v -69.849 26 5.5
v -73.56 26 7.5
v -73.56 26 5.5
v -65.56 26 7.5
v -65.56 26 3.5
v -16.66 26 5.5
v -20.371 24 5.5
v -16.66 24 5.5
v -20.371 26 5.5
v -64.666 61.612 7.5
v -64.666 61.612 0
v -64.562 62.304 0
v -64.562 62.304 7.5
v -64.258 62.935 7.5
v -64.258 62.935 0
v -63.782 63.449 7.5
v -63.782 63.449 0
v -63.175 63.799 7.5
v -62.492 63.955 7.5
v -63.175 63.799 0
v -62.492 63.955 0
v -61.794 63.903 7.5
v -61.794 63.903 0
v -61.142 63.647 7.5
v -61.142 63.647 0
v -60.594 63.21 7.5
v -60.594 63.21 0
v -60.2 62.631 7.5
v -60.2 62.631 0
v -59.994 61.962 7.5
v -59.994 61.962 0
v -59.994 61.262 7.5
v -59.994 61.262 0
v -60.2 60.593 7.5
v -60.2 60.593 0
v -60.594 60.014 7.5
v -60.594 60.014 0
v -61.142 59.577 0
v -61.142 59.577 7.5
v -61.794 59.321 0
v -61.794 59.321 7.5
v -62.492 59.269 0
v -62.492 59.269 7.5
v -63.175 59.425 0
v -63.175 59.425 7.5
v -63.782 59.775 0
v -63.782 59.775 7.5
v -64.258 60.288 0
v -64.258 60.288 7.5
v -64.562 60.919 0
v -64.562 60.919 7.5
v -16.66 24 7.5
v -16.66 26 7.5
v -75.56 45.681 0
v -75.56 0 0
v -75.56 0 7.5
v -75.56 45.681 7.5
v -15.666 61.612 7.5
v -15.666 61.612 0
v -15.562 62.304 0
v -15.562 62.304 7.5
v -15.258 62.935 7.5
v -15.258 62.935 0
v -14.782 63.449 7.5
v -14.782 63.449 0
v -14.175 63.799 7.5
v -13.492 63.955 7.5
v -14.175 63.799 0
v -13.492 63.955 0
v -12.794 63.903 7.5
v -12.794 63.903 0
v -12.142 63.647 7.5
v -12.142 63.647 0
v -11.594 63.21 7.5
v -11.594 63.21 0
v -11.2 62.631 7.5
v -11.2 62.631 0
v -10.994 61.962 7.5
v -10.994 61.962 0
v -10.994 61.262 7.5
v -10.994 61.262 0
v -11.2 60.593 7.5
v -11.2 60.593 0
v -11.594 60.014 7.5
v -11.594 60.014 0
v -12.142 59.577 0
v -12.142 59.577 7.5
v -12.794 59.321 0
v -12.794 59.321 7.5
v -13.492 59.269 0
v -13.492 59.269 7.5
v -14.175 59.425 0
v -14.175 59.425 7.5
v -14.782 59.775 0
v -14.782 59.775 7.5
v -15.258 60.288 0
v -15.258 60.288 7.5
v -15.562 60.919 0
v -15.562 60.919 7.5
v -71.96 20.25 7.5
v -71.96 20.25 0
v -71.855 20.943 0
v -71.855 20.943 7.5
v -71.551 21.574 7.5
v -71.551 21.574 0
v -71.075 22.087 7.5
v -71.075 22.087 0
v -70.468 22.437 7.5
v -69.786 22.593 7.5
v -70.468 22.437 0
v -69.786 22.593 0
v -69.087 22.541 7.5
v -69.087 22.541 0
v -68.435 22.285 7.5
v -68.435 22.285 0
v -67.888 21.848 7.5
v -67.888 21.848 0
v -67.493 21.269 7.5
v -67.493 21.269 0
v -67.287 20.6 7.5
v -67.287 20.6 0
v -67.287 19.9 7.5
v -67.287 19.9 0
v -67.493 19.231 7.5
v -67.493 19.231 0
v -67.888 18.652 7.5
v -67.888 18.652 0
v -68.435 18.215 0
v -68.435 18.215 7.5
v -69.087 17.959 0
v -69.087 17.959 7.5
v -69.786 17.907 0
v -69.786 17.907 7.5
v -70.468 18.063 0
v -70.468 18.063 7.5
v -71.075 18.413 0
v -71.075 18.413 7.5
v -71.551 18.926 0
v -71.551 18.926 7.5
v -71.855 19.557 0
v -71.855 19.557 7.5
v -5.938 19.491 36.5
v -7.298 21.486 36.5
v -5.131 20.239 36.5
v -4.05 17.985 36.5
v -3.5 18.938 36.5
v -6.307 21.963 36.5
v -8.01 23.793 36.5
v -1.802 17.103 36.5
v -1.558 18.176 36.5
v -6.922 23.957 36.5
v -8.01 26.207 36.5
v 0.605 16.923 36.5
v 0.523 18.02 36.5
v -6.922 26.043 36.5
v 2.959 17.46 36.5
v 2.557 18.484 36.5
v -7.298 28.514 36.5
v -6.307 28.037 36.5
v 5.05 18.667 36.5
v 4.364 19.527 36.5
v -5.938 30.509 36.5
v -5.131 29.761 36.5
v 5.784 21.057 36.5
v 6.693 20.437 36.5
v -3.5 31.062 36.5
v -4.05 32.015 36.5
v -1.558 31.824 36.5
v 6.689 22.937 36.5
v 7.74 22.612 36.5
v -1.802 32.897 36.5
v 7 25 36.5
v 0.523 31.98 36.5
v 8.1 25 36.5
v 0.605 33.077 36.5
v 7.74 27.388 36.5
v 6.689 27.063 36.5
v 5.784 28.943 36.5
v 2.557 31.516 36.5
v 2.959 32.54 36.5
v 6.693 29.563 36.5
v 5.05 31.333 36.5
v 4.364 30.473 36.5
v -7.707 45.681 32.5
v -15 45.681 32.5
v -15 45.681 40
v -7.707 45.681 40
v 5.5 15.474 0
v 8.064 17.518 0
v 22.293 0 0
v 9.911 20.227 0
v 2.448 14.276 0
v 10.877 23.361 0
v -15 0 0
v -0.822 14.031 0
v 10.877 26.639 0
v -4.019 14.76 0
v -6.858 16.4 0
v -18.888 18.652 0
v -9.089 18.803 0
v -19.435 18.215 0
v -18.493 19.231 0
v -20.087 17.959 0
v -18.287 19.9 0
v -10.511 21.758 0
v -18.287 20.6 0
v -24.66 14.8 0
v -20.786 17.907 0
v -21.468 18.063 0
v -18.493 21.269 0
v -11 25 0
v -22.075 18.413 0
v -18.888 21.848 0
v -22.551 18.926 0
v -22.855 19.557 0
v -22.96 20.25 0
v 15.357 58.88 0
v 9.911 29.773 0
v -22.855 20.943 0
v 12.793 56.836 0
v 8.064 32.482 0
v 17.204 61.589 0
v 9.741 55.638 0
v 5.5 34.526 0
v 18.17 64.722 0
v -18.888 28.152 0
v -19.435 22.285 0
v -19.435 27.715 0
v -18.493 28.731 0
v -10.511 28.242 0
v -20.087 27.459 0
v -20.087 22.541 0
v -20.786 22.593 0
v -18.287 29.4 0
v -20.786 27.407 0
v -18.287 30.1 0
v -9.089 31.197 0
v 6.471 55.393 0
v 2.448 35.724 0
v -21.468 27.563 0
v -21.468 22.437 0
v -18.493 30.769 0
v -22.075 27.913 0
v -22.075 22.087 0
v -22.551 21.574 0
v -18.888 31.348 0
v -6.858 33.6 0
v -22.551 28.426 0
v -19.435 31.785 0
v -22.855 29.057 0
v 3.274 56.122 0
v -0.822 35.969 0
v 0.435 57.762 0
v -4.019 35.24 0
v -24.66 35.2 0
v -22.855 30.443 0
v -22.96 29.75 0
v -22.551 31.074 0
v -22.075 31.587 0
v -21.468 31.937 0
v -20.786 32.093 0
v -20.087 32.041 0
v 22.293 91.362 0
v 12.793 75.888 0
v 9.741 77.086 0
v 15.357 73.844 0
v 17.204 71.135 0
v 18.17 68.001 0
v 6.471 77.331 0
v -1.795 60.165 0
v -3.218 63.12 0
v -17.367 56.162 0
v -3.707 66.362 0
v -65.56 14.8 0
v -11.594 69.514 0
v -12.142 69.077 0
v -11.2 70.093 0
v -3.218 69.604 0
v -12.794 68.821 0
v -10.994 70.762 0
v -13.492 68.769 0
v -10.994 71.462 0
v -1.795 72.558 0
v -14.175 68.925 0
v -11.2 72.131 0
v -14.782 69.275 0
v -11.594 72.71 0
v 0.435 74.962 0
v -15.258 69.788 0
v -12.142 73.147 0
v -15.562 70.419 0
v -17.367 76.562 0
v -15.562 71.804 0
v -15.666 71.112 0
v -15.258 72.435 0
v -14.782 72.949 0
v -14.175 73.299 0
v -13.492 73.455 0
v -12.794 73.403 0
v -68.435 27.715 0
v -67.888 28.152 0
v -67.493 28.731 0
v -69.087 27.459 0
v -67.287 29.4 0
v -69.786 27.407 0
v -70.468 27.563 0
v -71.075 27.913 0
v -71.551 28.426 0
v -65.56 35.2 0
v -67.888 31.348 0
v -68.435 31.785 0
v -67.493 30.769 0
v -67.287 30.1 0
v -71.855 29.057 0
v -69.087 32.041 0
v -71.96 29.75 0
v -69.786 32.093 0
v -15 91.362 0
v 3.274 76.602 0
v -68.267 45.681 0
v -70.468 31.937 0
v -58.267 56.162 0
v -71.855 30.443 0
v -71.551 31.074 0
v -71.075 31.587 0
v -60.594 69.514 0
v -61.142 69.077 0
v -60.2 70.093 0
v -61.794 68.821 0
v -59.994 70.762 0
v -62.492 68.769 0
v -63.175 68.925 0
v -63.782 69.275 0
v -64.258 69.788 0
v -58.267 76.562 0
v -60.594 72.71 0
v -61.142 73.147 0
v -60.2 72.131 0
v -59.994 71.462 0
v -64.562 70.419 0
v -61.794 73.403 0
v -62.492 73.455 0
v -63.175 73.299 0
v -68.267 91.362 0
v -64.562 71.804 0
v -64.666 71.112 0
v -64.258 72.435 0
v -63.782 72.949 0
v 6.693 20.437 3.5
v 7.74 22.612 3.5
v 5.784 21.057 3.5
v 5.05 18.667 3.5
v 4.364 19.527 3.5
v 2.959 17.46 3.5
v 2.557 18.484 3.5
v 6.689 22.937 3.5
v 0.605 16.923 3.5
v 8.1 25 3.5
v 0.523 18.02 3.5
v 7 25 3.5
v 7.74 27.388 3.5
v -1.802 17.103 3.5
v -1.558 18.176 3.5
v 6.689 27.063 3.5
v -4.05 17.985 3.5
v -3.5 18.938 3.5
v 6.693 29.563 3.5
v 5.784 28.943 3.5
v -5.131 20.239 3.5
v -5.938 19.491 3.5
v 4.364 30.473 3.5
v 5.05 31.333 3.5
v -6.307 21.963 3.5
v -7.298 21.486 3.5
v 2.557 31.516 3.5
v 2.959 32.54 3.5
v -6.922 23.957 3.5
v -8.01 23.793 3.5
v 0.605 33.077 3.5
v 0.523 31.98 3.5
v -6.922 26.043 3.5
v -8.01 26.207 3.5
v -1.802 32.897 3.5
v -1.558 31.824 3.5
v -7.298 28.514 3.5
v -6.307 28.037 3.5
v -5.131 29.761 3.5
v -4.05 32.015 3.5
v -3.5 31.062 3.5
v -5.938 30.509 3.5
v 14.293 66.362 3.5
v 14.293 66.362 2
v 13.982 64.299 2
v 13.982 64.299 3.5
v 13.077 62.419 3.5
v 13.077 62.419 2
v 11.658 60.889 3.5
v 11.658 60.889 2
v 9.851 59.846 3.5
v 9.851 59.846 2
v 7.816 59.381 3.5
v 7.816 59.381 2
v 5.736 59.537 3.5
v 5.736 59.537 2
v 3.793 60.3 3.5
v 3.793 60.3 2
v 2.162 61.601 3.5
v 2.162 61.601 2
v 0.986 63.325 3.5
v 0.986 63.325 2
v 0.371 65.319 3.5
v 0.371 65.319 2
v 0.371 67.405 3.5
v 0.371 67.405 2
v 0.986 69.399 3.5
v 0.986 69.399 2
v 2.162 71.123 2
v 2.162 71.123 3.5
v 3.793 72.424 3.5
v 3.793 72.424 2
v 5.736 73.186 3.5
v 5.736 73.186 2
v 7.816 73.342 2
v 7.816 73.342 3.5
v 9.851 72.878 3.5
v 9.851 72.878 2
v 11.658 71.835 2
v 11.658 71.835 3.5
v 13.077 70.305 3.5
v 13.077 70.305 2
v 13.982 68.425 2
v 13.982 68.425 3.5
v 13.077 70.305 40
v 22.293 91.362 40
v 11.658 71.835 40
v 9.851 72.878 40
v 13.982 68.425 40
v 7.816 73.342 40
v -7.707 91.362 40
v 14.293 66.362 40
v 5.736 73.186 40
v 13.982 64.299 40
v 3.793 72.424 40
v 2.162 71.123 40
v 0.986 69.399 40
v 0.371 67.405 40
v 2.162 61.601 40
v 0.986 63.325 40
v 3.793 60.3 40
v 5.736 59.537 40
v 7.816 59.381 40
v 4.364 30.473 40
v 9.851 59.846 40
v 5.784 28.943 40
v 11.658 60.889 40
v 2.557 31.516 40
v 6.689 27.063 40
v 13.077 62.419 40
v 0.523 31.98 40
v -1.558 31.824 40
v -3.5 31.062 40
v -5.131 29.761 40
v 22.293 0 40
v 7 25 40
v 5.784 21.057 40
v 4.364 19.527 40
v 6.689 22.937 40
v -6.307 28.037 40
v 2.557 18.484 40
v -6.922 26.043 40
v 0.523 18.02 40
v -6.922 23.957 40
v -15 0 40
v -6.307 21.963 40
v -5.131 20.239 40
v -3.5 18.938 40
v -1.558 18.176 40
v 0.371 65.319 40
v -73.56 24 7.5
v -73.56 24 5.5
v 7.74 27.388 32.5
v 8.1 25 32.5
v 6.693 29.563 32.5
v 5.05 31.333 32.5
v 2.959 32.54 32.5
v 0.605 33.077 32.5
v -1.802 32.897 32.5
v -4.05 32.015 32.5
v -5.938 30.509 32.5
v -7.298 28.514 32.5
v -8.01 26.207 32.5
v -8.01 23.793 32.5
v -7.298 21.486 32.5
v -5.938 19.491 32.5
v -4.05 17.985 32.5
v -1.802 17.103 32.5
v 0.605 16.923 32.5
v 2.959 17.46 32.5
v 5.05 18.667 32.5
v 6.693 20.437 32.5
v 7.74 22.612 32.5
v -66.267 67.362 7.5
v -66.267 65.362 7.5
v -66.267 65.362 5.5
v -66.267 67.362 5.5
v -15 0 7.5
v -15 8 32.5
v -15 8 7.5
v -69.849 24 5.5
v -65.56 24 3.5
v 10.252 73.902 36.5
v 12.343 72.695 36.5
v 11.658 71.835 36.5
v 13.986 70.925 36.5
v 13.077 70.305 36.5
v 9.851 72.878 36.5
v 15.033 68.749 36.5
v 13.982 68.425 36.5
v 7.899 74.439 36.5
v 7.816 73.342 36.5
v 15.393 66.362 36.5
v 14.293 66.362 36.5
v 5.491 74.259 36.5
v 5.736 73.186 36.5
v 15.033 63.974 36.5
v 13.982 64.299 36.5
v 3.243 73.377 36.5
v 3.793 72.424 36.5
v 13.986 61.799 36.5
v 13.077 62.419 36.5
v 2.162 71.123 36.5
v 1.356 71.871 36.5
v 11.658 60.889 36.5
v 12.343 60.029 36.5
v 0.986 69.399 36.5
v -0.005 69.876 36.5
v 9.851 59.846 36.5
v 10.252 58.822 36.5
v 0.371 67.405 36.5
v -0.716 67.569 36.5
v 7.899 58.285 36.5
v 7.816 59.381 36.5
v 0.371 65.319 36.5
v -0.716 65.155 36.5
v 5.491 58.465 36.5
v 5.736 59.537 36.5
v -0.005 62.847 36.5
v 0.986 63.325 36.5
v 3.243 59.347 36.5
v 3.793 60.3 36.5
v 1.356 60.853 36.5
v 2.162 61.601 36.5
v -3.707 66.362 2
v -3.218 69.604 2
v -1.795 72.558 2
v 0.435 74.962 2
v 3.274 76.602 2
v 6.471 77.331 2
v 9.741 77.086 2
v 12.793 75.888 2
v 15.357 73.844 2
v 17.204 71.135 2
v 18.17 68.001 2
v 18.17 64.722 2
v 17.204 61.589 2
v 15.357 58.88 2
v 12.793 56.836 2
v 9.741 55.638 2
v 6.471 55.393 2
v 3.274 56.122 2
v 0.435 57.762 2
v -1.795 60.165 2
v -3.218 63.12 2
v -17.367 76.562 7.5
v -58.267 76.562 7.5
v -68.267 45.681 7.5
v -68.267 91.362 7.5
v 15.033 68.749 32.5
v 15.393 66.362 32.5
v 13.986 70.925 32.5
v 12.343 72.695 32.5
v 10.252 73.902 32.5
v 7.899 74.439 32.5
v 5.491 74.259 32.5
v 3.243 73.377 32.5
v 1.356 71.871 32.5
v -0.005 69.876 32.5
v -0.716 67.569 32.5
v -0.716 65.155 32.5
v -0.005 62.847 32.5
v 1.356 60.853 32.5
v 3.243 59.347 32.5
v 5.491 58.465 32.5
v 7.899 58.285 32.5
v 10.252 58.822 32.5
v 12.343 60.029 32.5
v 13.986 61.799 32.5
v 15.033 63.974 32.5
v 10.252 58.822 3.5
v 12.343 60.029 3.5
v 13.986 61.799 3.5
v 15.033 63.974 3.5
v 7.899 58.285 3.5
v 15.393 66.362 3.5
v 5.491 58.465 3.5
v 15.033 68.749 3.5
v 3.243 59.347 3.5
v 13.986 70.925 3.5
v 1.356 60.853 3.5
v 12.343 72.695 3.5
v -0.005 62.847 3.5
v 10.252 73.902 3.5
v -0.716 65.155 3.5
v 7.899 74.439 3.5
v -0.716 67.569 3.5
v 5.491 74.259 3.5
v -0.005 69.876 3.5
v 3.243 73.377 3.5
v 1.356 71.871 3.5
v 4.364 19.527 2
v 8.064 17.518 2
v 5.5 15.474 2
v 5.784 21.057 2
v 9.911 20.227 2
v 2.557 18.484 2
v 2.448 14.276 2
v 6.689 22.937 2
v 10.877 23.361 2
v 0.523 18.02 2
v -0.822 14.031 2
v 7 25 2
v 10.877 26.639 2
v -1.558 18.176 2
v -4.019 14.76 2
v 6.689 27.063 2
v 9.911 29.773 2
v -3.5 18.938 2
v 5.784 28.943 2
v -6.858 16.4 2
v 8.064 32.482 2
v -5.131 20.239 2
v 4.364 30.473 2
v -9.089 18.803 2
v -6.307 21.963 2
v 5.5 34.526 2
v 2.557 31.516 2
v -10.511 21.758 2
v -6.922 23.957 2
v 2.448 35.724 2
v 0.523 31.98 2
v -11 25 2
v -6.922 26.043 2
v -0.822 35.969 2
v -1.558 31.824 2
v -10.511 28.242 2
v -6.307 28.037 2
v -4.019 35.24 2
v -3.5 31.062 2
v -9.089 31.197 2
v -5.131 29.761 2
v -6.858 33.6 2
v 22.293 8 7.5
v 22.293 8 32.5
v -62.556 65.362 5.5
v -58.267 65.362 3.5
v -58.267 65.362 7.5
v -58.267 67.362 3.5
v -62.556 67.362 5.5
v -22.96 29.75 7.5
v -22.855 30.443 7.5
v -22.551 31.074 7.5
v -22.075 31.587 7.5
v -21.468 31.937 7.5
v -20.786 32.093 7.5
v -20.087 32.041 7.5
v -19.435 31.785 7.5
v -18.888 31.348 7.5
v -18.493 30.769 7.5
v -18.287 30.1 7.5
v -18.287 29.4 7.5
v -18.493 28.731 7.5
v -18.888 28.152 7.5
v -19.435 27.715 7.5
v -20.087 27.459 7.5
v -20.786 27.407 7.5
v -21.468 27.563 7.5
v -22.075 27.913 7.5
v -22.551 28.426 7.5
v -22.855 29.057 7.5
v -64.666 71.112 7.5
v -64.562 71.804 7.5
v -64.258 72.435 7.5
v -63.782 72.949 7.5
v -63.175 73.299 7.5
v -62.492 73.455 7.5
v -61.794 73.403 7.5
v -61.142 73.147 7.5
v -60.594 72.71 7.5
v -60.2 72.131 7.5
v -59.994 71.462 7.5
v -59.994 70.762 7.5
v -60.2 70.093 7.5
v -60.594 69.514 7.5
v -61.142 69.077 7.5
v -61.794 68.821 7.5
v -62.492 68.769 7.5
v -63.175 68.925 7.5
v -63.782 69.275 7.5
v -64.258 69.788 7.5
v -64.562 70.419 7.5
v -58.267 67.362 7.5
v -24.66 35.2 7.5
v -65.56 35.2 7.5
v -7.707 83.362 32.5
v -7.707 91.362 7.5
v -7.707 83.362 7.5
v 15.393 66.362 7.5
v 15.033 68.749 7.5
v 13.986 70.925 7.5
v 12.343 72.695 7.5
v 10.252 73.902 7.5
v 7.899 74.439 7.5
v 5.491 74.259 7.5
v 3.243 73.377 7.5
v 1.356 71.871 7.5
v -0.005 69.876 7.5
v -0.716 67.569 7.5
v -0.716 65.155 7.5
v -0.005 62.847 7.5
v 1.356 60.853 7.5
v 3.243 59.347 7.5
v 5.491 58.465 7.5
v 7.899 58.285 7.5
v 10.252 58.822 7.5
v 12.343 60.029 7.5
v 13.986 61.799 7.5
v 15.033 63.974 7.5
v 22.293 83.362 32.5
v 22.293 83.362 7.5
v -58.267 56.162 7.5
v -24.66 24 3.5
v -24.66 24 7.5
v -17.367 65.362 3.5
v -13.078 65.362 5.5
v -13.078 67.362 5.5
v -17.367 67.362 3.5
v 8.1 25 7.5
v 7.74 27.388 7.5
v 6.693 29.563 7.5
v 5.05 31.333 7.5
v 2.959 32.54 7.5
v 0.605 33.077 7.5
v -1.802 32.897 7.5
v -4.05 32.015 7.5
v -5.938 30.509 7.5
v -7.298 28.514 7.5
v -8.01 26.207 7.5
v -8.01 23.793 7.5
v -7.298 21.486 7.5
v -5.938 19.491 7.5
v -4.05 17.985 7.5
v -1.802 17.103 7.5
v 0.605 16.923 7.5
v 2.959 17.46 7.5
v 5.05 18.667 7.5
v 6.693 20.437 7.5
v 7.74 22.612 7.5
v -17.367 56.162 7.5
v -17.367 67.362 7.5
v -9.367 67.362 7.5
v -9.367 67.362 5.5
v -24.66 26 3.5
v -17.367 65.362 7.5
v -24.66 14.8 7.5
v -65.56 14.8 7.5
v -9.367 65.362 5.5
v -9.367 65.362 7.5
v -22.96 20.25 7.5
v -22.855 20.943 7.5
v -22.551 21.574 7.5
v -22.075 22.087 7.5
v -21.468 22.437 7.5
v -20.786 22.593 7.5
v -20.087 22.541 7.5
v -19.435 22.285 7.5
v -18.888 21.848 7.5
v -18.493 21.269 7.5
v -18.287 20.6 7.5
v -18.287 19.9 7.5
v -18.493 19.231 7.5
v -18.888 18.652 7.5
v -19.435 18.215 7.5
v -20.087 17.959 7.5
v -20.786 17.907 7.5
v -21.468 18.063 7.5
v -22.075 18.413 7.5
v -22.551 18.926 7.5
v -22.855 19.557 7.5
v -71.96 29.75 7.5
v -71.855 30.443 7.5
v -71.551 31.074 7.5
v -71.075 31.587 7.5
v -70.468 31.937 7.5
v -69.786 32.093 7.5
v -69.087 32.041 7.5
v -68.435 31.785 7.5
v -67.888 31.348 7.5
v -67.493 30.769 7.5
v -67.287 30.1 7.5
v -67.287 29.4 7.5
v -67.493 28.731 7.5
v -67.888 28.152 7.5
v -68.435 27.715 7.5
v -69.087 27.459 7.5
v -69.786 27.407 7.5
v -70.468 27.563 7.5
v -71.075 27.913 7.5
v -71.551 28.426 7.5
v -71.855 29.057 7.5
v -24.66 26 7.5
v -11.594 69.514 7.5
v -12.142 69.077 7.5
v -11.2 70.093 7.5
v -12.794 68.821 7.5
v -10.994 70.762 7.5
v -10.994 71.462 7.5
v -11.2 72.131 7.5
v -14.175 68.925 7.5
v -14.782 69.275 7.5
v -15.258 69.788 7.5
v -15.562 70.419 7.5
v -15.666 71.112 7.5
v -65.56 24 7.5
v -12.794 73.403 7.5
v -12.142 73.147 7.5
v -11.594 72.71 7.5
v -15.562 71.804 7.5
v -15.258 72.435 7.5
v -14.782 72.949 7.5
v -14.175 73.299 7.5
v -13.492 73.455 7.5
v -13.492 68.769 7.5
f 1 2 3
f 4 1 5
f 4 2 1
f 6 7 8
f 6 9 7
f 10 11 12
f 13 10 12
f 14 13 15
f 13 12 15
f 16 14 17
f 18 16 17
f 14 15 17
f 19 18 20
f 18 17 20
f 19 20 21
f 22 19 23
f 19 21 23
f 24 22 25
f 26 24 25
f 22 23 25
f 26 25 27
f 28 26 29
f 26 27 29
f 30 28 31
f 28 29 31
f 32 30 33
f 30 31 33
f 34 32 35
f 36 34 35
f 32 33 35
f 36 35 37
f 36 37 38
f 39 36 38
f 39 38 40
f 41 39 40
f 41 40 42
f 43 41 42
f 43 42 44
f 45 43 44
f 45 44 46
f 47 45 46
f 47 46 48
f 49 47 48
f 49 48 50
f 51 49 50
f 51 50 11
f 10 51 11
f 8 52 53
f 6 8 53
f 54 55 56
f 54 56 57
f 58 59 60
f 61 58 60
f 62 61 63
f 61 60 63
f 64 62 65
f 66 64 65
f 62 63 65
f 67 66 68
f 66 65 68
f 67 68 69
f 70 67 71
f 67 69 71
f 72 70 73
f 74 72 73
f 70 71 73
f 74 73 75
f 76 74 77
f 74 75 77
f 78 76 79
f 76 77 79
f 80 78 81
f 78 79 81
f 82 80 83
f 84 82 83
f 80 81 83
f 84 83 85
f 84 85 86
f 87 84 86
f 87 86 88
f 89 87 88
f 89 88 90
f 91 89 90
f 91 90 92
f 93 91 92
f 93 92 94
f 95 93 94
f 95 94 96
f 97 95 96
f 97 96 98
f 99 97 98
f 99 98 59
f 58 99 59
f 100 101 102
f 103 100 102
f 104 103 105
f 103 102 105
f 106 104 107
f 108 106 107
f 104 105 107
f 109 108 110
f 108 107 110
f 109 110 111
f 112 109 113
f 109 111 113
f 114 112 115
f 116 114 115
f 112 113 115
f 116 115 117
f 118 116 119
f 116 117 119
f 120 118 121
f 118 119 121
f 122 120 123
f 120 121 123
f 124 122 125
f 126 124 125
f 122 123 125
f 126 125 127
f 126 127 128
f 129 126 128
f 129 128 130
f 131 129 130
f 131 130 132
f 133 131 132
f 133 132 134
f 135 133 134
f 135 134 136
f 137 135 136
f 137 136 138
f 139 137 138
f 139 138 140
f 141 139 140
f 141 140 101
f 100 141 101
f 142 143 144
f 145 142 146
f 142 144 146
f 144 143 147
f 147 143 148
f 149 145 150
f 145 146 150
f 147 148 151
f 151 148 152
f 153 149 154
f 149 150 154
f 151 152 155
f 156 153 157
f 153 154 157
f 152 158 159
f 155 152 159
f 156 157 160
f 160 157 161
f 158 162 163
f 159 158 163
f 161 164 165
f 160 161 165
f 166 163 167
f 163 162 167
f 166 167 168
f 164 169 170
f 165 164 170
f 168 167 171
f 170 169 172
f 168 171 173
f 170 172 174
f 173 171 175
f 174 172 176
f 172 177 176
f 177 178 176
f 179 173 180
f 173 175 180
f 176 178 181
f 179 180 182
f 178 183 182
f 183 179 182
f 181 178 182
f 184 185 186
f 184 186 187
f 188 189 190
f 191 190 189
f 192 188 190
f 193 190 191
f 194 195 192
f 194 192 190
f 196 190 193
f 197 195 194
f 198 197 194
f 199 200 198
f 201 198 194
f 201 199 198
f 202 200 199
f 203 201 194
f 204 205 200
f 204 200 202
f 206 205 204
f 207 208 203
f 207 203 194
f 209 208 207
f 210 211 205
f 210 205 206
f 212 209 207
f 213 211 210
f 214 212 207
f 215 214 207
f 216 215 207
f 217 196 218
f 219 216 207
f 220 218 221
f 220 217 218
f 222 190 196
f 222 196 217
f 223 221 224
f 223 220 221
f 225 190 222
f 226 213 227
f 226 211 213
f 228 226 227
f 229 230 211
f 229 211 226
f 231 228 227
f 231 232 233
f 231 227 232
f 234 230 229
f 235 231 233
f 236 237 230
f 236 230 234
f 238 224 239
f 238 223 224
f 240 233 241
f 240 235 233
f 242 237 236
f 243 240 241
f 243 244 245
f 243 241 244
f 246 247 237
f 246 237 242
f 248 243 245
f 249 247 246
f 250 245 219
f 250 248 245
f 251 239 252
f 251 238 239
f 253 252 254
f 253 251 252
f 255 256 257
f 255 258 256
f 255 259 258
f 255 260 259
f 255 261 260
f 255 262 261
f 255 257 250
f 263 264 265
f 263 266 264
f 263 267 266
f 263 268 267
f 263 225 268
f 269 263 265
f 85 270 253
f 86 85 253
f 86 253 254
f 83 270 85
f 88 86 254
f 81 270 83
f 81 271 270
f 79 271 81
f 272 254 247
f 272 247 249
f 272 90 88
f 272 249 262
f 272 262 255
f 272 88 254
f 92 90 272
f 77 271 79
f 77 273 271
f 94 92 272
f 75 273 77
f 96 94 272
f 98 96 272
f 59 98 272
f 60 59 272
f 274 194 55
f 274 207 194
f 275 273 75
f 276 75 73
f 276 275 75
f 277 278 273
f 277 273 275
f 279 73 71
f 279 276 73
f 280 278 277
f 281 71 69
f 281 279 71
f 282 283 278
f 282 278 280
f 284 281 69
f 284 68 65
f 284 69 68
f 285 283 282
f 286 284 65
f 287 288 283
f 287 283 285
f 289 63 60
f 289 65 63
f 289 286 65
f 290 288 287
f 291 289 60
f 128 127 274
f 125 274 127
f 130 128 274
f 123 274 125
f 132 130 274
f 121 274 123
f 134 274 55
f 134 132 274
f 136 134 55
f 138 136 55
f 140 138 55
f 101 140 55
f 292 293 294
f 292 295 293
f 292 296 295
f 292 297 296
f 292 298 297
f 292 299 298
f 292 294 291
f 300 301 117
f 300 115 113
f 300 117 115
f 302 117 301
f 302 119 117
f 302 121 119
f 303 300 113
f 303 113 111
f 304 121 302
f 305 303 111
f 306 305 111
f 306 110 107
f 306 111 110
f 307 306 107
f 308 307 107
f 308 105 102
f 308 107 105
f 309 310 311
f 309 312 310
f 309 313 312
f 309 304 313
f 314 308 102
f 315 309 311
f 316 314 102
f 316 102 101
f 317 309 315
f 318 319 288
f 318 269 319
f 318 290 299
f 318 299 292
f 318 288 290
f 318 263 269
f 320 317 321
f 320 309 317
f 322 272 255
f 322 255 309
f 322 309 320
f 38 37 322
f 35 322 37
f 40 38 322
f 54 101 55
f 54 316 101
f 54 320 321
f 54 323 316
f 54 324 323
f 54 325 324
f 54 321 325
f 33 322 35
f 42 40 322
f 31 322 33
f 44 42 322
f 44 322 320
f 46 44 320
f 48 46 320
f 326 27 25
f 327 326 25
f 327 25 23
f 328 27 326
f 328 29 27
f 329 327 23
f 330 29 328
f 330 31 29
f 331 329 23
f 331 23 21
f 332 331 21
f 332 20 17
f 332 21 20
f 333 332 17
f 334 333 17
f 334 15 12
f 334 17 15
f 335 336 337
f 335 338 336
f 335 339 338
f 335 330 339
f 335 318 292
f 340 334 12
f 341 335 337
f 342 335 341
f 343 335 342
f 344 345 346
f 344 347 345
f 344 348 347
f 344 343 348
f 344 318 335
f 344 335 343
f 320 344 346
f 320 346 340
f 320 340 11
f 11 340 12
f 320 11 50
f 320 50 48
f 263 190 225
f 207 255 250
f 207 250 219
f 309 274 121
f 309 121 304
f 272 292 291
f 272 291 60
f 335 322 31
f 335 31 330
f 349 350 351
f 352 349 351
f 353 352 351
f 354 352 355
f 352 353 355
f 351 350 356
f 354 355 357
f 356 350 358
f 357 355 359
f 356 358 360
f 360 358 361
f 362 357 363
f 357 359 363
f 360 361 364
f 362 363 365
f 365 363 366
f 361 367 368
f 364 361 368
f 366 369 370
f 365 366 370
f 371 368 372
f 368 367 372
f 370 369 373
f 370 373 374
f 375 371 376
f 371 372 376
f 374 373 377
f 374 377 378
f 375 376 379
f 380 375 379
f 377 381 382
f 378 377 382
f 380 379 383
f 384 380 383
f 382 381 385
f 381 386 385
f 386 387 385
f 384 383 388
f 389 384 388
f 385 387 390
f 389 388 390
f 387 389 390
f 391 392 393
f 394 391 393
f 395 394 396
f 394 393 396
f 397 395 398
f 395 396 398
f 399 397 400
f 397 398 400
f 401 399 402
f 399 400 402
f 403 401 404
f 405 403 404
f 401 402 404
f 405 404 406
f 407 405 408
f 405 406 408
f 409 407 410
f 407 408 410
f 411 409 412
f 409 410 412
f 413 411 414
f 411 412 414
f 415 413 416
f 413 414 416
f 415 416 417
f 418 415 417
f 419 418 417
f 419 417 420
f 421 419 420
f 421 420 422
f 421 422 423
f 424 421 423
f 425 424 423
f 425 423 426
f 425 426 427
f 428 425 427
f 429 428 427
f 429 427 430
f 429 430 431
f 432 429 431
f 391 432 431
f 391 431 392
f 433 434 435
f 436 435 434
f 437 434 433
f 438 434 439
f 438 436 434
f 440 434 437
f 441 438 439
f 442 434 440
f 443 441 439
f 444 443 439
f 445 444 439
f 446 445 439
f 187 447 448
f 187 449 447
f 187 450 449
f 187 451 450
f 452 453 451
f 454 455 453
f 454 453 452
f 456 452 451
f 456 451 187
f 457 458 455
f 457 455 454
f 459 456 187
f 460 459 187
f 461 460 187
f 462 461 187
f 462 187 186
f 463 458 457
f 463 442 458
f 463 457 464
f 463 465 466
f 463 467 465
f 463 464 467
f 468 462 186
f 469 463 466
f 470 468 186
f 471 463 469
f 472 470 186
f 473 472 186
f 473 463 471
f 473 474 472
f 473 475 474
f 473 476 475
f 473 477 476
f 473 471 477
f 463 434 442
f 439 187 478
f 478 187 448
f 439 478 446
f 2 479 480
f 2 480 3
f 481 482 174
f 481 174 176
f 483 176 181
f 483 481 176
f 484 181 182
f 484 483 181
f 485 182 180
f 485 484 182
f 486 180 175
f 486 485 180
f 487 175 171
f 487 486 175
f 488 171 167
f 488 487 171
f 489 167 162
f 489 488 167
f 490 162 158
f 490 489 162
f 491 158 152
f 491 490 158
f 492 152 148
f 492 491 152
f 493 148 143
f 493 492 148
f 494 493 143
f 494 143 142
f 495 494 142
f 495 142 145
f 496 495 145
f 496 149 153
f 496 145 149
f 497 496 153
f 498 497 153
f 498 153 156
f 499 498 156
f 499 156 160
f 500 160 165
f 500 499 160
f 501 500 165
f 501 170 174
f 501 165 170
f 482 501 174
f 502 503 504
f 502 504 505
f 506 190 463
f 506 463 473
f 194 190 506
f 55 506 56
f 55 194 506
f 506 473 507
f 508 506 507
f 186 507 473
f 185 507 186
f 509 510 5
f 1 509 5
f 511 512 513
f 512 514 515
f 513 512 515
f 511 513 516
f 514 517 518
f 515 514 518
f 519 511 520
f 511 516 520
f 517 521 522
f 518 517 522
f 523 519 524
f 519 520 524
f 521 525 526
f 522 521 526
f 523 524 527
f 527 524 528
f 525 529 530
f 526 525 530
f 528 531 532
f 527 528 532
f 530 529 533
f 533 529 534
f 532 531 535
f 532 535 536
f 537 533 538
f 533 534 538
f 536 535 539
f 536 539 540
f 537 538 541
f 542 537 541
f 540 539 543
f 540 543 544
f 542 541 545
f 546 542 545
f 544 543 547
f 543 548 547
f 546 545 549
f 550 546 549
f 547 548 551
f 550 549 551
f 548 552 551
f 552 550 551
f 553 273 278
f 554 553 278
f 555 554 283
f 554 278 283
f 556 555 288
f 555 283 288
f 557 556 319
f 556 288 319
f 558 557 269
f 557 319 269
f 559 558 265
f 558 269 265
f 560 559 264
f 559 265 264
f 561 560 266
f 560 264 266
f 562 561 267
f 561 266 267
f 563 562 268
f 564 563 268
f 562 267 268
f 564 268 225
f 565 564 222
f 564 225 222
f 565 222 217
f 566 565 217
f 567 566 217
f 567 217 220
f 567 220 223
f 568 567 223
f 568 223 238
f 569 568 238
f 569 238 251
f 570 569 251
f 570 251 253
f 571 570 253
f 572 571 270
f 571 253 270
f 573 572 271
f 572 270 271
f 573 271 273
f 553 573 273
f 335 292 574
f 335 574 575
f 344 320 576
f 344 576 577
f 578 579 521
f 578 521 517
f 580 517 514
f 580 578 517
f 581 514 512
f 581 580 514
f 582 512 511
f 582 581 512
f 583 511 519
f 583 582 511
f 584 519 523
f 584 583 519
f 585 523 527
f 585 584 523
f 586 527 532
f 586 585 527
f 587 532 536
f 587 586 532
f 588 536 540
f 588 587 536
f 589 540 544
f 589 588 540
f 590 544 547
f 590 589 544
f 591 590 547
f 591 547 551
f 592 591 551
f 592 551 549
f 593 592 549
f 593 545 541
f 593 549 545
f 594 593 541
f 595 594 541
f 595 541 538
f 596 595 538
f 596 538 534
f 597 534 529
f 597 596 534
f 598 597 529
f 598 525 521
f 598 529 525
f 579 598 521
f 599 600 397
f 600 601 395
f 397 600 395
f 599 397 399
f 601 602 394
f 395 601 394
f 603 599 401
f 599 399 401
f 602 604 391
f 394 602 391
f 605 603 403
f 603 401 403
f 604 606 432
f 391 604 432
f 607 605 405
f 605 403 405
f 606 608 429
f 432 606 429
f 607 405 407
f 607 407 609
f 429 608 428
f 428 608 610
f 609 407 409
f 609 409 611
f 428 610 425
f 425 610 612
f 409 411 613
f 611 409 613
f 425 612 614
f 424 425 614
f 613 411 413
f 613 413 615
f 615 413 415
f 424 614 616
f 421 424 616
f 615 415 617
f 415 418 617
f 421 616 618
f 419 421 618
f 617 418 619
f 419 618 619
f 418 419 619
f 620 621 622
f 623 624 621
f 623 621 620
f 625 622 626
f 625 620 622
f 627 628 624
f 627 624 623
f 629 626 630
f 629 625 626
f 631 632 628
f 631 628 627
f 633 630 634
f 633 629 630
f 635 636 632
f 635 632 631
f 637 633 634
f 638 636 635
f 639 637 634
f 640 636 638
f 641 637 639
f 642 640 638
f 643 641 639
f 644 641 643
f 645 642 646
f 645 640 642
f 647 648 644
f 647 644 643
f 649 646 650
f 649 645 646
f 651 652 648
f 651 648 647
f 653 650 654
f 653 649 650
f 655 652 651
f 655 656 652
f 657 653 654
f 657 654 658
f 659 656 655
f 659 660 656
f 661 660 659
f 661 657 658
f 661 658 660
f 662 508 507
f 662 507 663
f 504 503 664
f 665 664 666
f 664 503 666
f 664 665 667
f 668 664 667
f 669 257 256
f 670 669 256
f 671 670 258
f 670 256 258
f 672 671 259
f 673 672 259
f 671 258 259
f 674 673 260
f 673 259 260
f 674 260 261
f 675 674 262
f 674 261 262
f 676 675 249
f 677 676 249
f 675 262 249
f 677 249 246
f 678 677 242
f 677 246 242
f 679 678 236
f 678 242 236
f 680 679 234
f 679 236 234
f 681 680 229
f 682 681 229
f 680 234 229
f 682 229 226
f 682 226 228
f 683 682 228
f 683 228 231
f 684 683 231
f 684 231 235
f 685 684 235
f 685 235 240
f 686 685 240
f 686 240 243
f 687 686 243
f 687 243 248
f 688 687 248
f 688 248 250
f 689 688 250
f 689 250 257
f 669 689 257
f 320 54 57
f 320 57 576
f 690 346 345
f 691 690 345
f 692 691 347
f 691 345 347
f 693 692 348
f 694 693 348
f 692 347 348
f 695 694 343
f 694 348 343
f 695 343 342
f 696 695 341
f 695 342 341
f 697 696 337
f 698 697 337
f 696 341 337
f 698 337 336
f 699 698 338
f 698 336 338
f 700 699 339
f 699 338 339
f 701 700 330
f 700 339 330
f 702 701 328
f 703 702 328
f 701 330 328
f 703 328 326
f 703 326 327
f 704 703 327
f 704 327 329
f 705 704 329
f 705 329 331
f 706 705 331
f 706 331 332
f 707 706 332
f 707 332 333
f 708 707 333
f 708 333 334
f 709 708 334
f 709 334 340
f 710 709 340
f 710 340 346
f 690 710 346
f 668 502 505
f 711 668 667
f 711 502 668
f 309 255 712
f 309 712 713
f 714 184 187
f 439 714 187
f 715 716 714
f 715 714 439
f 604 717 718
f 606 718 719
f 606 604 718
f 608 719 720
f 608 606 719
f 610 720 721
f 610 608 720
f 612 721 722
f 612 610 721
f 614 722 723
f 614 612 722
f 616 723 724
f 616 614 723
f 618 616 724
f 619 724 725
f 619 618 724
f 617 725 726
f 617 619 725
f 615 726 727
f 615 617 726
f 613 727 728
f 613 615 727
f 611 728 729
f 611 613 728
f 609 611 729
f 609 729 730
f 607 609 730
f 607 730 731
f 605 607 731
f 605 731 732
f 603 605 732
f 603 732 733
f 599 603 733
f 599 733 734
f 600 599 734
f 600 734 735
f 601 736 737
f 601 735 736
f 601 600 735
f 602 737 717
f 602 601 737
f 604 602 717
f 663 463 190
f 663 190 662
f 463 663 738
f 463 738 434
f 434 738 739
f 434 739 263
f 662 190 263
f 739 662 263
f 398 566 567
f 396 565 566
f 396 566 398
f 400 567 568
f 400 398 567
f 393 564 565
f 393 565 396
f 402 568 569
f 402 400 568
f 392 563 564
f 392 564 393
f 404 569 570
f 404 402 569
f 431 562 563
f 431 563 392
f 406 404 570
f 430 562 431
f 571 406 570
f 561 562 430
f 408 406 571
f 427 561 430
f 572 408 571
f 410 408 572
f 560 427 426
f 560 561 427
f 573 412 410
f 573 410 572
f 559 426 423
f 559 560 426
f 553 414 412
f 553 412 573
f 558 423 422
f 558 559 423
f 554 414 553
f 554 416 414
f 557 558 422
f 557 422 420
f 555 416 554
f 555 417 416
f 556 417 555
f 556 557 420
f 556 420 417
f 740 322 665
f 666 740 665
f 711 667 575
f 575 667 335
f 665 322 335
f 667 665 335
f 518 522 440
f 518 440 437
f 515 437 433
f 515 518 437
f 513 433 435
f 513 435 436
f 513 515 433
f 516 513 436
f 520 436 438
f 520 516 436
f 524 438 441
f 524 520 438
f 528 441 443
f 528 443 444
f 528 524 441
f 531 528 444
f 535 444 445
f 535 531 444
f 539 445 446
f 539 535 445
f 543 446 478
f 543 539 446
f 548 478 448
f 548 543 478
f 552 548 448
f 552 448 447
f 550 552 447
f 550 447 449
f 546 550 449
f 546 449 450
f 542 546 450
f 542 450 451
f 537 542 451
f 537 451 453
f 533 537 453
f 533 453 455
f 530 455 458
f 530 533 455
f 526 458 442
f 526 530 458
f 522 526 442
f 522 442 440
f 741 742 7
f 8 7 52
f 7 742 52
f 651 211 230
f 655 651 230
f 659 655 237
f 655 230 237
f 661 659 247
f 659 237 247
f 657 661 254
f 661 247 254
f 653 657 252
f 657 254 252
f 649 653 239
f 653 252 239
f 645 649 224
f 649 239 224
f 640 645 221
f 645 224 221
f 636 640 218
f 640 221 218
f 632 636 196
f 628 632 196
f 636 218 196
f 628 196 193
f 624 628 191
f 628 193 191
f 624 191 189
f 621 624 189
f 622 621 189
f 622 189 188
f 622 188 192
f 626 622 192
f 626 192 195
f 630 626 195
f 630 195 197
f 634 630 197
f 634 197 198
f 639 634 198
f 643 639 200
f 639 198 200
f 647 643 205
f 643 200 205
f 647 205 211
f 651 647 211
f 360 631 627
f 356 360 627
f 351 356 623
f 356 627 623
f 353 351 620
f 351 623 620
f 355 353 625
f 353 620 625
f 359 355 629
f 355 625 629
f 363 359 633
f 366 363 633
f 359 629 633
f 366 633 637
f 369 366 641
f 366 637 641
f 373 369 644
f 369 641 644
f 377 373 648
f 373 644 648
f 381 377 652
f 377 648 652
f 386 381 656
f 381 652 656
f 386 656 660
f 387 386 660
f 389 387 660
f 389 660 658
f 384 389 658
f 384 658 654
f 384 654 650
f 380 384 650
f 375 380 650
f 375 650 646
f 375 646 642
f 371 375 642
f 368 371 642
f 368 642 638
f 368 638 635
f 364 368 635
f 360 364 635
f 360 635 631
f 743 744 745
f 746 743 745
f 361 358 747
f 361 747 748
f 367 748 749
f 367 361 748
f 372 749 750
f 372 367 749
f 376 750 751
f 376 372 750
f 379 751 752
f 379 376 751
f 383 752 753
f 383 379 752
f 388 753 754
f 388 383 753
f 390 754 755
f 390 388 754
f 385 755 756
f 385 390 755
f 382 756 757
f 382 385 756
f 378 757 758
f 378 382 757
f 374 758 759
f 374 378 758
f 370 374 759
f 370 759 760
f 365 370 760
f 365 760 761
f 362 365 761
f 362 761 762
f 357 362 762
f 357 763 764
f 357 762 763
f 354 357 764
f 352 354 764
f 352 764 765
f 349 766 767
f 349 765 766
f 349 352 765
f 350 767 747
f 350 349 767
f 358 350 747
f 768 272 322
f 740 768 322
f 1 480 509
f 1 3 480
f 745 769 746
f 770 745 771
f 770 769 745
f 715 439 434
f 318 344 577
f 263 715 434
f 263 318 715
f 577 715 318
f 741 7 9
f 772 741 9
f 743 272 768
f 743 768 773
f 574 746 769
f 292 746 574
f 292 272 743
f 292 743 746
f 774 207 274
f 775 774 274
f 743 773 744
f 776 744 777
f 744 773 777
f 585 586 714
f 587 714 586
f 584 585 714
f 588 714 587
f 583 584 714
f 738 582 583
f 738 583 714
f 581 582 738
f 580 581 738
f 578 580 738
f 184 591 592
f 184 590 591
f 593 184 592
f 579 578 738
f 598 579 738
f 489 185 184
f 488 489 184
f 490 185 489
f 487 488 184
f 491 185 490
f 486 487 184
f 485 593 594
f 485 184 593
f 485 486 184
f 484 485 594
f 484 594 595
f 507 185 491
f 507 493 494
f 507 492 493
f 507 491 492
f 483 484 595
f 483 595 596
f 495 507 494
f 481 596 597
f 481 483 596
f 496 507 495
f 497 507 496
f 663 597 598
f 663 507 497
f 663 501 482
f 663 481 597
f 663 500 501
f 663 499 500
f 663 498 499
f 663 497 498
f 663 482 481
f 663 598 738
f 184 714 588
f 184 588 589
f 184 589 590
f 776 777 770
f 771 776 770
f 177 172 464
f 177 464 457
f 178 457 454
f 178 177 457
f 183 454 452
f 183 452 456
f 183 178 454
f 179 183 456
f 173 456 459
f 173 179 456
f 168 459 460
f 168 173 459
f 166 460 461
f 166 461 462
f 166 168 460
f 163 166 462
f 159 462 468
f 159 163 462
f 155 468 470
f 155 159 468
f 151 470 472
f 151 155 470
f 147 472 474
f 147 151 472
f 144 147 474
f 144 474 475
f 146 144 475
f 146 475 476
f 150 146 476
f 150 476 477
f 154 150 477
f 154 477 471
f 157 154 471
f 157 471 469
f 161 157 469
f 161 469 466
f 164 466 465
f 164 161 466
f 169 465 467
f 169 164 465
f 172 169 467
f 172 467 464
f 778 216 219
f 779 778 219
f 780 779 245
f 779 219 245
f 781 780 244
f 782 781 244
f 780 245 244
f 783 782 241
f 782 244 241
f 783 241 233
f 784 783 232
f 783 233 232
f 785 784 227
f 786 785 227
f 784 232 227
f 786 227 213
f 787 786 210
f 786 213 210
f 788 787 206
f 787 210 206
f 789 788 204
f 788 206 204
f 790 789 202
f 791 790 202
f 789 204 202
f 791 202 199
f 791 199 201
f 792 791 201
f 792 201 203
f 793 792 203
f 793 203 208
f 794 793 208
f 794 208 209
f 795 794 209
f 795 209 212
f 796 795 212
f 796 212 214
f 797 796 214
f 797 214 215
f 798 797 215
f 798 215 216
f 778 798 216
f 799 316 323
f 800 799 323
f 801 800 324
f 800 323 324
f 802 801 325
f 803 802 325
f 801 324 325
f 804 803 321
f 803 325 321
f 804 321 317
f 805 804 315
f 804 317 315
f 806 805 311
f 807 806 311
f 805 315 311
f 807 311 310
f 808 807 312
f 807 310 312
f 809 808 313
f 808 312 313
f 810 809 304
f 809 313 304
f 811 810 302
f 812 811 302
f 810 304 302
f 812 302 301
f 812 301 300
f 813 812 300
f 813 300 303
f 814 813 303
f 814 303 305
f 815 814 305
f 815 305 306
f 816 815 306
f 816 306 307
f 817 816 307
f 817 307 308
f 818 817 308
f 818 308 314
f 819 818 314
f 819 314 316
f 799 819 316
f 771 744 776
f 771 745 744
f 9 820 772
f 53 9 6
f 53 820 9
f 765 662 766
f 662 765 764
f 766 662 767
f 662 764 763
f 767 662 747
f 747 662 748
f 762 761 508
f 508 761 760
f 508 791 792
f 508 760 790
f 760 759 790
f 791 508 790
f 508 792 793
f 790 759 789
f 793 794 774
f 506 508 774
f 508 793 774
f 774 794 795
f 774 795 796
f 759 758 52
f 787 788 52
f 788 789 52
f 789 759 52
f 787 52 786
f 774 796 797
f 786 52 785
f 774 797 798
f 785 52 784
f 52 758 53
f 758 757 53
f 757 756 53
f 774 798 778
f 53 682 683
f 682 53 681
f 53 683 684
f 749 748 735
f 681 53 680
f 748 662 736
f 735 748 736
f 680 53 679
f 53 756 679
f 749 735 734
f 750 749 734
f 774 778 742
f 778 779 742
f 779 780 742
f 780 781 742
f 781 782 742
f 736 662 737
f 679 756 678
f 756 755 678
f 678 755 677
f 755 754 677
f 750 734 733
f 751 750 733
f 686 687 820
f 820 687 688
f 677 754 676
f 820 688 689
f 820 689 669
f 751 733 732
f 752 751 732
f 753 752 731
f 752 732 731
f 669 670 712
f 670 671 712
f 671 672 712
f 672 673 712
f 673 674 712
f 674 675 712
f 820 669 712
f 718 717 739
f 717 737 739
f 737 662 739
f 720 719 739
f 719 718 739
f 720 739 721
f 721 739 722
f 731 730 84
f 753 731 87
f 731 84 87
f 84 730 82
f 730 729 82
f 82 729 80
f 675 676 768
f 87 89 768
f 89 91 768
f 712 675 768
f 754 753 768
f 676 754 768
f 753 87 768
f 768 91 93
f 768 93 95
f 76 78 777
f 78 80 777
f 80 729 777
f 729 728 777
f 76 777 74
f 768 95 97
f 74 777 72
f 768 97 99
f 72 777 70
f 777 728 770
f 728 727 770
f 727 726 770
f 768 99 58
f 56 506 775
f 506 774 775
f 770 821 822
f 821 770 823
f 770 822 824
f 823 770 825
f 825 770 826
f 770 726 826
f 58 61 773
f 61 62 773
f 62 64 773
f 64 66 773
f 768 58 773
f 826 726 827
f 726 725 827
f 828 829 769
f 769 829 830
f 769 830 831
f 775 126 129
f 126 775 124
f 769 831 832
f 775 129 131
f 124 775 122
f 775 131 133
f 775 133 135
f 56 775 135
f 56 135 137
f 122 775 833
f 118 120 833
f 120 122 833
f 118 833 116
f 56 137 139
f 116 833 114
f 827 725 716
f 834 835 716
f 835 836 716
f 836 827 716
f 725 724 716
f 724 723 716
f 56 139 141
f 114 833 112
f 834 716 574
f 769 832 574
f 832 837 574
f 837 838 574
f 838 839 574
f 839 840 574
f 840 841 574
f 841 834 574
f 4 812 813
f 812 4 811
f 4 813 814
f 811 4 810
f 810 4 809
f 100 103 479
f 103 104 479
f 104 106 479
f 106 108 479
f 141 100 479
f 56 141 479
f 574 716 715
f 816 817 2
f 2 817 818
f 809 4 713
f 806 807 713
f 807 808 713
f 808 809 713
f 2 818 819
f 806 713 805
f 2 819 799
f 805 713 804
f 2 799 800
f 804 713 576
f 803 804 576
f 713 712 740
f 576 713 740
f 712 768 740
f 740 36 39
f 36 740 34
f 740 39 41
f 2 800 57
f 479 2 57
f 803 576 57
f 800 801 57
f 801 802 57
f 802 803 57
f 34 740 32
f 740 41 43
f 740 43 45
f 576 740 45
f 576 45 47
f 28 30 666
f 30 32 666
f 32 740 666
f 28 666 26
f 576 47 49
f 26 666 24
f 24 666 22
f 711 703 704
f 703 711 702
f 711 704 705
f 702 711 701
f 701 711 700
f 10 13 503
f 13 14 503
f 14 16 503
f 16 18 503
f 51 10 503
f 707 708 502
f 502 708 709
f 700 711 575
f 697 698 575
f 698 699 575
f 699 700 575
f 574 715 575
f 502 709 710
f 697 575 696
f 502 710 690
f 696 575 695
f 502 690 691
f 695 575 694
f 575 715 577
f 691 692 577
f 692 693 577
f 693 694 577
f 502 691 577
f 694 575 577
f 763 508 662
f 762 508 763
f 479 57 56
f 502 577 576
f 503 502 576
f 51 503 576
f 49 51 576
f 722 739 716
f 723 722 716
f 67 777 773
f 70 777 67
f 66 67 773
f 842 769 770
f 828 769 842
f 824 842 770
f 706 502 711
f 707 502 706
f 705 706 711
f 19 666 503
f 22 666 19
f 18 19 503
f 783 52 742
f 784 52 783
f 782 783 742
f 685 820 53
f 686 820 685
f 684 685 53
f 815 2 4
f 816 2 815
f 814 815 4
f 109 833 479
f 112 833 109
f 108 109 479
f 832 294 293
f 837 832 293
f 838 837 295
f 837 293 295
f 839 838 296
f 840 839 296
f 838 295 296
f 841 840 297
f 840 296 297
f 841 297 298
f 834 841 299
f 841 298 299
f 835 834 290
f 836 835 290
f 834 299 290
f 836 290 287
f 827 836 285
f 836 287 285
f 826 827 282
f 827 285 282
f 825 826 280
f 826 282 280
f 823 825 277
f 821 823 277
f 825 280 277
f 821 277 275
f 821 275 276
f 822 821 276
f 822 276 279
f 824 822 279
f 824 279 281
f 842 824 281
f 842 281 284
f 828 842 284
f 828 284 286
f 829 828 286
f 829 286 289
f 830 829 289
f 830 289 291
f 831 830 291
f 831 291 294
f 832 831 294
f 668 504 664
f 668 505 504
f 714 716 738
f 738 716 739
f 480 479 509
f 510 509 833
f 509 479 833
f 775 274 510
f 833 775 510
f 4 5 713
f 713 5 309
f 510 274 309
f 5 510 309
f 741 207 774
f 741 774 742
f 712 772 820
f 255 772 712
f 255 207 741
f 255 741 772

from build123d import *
from OCP.BRepFilletAPI import BRepFilletAPI_MakeChamfer

# Parameters (mm, degrees)
SKETCH1_W           = 37.293223462
SKETCH1_H           = 91.361925627
SKETCH1_R           = 8.1
BOSS_EXTRUDE1_DEPTH = 40
CUT_EXTRUDE1_START  = 8
SKETCH2_W           = 37.293223462
SKETCH2_H           = 25
CUT_EXTRUDE1_DEPTH  = 95.195837814
BOSS_EXTRUDE2_START = -3.5
SKETCH10_R          = 8.1
SKETCH10_R_2        = 7
SKETCH10_R_3        = 10.837031589
BOSS_EXTRUDE2_DEPTH = 3.5
SKETCH11_R          = 8.1
SKETCH11_R_2        = 7
BOSS_EXTRUDE3_DEPTH = 3.5
SKETCH12_W          = 40.9
SKETCH12_H          = 20.4
BOSS_EXTRUDE4_DEPTH = 7.5
CUT_EXTRUDE2_REACH  = 127.125
SKETCH13_R          = 2.3495
SKETCH22_W          = 8
SKETCH22_H          = 2
CUT_EXTRUDE6_DEPTH  = 2
SKETCH14_W          = 37.293223462
SKETCH14_H          = 8
BOSS_EXTRUDE5_DEPTH = 25
CUT_EXTRUDE4_START  = -32.5
SKETCH18_W          = 7.293223462
SKETCH18_H          = 45.680962814
CUT_EXTRUDE4_DEPTH  = 32.5
SKETCH15_R          = 11
CUT_EXTRUDE3_DEPTH  = 2
CHAMFER2_SIZE       = 2
CHAMFER2_SIZE2      = 4.289013841


with BuildPart() as part:
    # Sketch1 → Boss-Extrude1 (new body)
    with BuildSketch(Plane.XY):
        with Locations((3.646611731, 45.680962814)):
            Rectangle(SKETCH1_W, SKETCH1_H)
        with Locations((0, 25)):
            Circle(SKETCH1_R, mode=Mode.SUBTRACT)
        with Locations((7.293223462, 66.361925627)):
            Circle(SKETCH1_R, mode=Mode.SUBTRACT)
    extrude(amount=BOSS_EXTRUDE1_DEPTH)

    # Sketch2 → Cut-Extrude1 (cut, through all)
    with BuildSketch(Plane(origin=(0, 0, 0), x_dir=(1, 0, 0), z_dir=(0, 1, 0)).offset(CUT_EXTRUDE1_START)):
        with Locations((3.646611731, -20)):
            Rectangle(SKETCH2_W, SKETCH2_H)
    extrude(amount=CUT_EXTRUDE1_DEPTH, mode=Mode.SUBTRACT)

    # Sketch10 → Boss-Extrude2 (add)
    # profile 1 of 2: a face of its own
    with BuildSketch(Plane.XY.offset(40).offset(BOSS_EXTRUDE2_START)):
        with Locations(Location((7.293223462, 66.361925627, 0), (0, 0, 180))):
            Circle(SKETCH10_R)
        with Locations((7.293223462, 66.361925627)):
            Circle(SKETCH10_R_2, mode=Mode.SUBTRACT)
    # profile 2 of 2: a face of its own
    with BuildSketch(Plane.XY.offset(40).offset(BOSS_EXTRUDE2_START)):
        with Locations((0, 25)):
            Circle(SKETCH10_R_3)
        with Locations((0, 25)):
            Circle(SKETCH10_R_2, mode=Mode.SUBTRACT)
    extrude(amount=BOSS_EXTRUDE2_DEPTH)

    # Sketch11 → Boss-Extrude3 (add)
    # profile 1 of 2: a face of its own
    with BuildSketch(Plane(origin=(0, 0, 0), x_dir=(-1, 0, 0), z_dir=(0, 0, -1))):
        with Locations((-7.293223462, 66.361925627)):
            Circle(SKETCH11_R)
        with Locations(Location((-7.293223462, 66.361925627, 0), (0, 0, 180))):
            Circle(SKETCH11_R_2, mode=Mode.SUBTRACT)
    # profile 2 of 2: a face of its own
    with BuildSketch(Plane(origin=(0, 0, 0), x_dir=(-1, 0, 0), z_dir=(0, 0, -1))):
        with Locations((0, 25)):
            Circle(SKETCH11_R)
        with Locations(Location((0, 25, 0), (0, 0, 180))):
            Circle(SKETCH11_R_2, mode=Mode.SUBTRACT)
    extrude(amount=-BOSS_EXTRUDE3_DEPTH)

    # Sketch12 → Boss-Extrude4 (add)
    with BuildSketch(Plane(origin=(0, 0, 0), x_dir=(-1, 0, 0), z_dir=(0, 0, -1))):
        Polygon((15, 0), (75.56, 0), (75.56, 45.680962813), (68.266776538, 45.680962813), (68.266776538, 91.361925627), (15, 91.361925627), align=None)
        with Locations((45.11, 25)):
            Rectangle(SKETCH12_W, SKETCH12_H, mode=Mode.SUBTRACT)
        with Locations((37.816776538, 66.361925627)):
            Rectangle(SKETCH12_W, SKETCH12_H, mode=Mode.SUBTRACT)
    extrude(amount=-BOSS_EXTRUDE4_DEPTH)

    # Sketch13 → Cut-Extrude2 (cut, up to next)
    with BuildSketch(Plane(origin=(0, 0, 0), x_dir=(-1, 0, 0), z_dir=(0, 0, -1)), mode=Mode.PRIVATE) as cut_extrude2_sk1:
        with Locations((20.61, 29.75)):
            Circle(SKETCH13_R)
    cut_extrude2_tool1 = extrude(cut_extrude2_sk1.sketch, amount=-CUT_EXTRUDE2_REACH, mode=Mode.PRIVATE) & part.part
    # Sketch13 → Cut-Extrude2 (cut, up to next)
    with BuildSketch(Plane(origin=(0, 0, 0), x_dir=(-1, 0, 0), z_dir=(0, 0, -1)), mode=Mode.PRIVATE) as cut_extrude2_sk2:
        with Locations((20.61, 20.25)):
            Circle(SKETCH13_R)
    cut_extrude2_tool2 = extrude(cut_extrude2_sk2.sketch, amount=-CUT_EXTRUDE2_REACH, mode=Mode.PRIVATE) & part.part
    # Sketch13 → Cut-Extrude2 (cut, up to next)
    with BuildSketch(Plane(origin=(0, 0, 0), x_dir=(-1, 0, 0), z_dir=(0, 0, -1)), mode=Mode.PRIVATE) as cut_extrude2_sk3:
        with Locations((69.61, 29.75)):
            Circle(SKETCH13_R)
    cut_extrude2_tool3 = extrude(cut_extrude2_sk3.sketch, amount=-CUT_EXTRUDE2_REACH, mode=Mode.PRIVATE) & part.part
    # Sketch13 → Cut-Extrude2 (cut, up to next)
    with BuildSketch(Plane(origin=(0, 0, 0), x_dir=(-1, 0, 0), z_dir=(0, 0, -1)), mode=Mode.PRIVATE) as cut_extrude2_sk4:
        with Locations((69.61, 20.25)):
            Circle(SKETCH13_R)
    cut_extrude2_tool4 = extrude(cut_extrude2_sk4.sketch, amount=-CUT_EXTRUDE2_REACH, mode=Mode.PRIVATE) & part.part
    # Sketch13 → Cut-Extrude2 (cut, up to next)
    with BuildSketch(Plane(origin=(0, 0, 0), x_dir=(-1, 0, 0), z_dir=(0, 0, -1)), mode=Mode.PRIVATE) as cut_extrude2_sk5:
        with Locations((13.316776538, 71.111925627)):
            Circle(SKETCH13_R)
    cut_extrude2_tool5 = extrude(cut_extrude2_sk5.sketch, amount=-CUT_EXTRUDE2_REACH, mode=Mode.PRIVATE) & part.part
    # Sketch13 → Cut-Extrude2 (cut, up to next)
    with BuildSketch(Plane(origin=(0, 0, 0), x_dir=(-1, 0, 0), z_dir=(0, 0, -1)), mode=Mode.PRIVATE) as cut_extrude2_sk6:
        with Locations((13.316776538, 61.611925627)):
            Circle(SKETCH13_R)
    cut_extrude2_tool6 = extrude(cut_extrude2_sk6.sketch, amount=-CUT_EXTRUDE2_REACH, mode=Mode.PRIVATE) & part.part
    # Sketch13 → Cut-Extrude2 (cut, up to next)
    with BuildSketch(Plane(origin=(0, 0, 0), x_dir=(-1, 0, 0), z_dir=(0, 0, -1)), mode=Mode.PRIVATE) as cut_extrude2_sk7:
        with Locations((62.316776538, 71.111925627)):
            Circle(SKETCH13_R)
    cut_extrude2_tool7 = extrude(cut_extrude2_sk7.sketch, amount=-CUT_EXTRUDE2_REACH, mode=Mode.PRIVATE) & part.part
    # Sketch13 → Cut-Extrude2 (cut, up to next)
    with BuildSketch(Plane(origin=(0, 0, 0), x_dir=(-1, 0, 0), z_dir=(0, 0, -1)), mode=Mode.PRIVATE) as cut_extrude2_sk8:
        with Locations((62.316776538, 61.611925627)):
            Circle(SKETCH13_R)
    cut_extrude2_tool8 = extrude(cut_extrude2_sk8.sketch, amount=-CUT_EXTRUDE2_REACH, mode=Mode.PRIVATE) & part.part
    add(cut_extrude2_tool1.solids().sort_by_distance((-20.61, 29.75, 0))[0], mode=Mode.SUBTRACT)
    add(cut_extrude2_tool2.solids().sort_by_distance((-20.61, 20.25, 0))[0], mode=Mode.SUBTRACT)
    add(cut_extrude2_tool3.solids().sort_by_distance((-69.61, 29.75, 0))[0], mode=Mode.SUBTRACT)
    add(cut_extrude2_tool4.solids().sort_by_distance((-69.61, 20.25, 0))[0], mode=Mode.SUBTRACT)
    add(cut_extrude2_tool5.solids().sort_by_distance((-13.316777, 71.111926, 0))[0], mode=Mode.SUBTRACT)
    add(cut_extrude2_tool6.solids().sort_by_distance((-13.316777, 61.611926, 0))[0], mode=Mode.SUBTRACT)
    add(cut_extrude2_tool7.solids().sort_by_distance((-62.316777, 71.111926, 0))[0], mode=Mode.SUBTRACT)
    add(cut_extrude2_tool8.solids().sort_by_distance((-62.316777, 61.611926, 0))[0], mode=Mode.SUBTRACT)

    # Sketch22 → Cut-Extrude6 (cut)
    with BuildSketch(Plane.XY.offset(7.5)):
        with Locations((-62.266776538, 66.361925627)):
            Rectangle(SKETCH22_W, SKETCH22_H)
        with Locations((-13.366776538, 66.361925627)):
            Rectangle(SKETCH22_W, SKETCH22_H)
        with Locations((-20.66, 25)):
            Rectangle(SKETCH22_W, SKETCH22_H)
        with Locations((-69.56, 25)):
            Rectangle(SKETCH22_W, SKETCH22_H)
    extrude(amount=-CUT_EXTRUDE6_DEPTH, mode=Mode.SUBTRACT)

    # Sketch14 → Boss-Extrude5 (add)
    with BuildSketch(Plane.XY.offset(7.5)):
        with Locations((3.646611731, 87.361925627)):
            Rectangle(SKETCH14_W, SKETCH14_H)
    extrude(amount=BOSS_EXTRUDE5_DEPTH)

    # Sketch18 → Cut-Extrude4 (cut)
    with BuildSketch(Plane.XY.offset(40).offset(CUT_EXTRUDE4_START)):
        with Locations((-11.353388269, 68.52144422)):
            Rectangle(SKETCH18_W, SKETCH18_H)
    extrude(amount=CUT_EXTRUDE4_DEPTH, mode=Mode.SUBTRACT)

    # Sketch15 → Cut-Extrude3 (cut)
    with BuildSketch(Plane(origin=(0, 0, 0), x_dir=(-1, 0, 0), z_dir=(0, 0, -1))):
        with Locations((0, 25)):
            Circle(SKETCH15_R)
        with Locations((-7.293223462, 66.361925627)):
            Circle(SKETCH15_R)
    extrude(amount=-CUT_EXTRUDE3_DEPTH, mode=Mode.SUBTRACT)

    # Chamfer2: one chamfer whose edges measure the first distance from different faces: ONE call of the kernel's chamfer builder (chamfer() names one face for all edges)
    chamfer2_edges_1 = [part.edges().sort_by_distance(p)[0] for p in [
        (-65.56, 25, 5.5),
    ]]
    chamfer2_side_1 = [part.faces().sort_by_distance(p)[0] for p in [
        (-65.56, 25, 3.676174497),
    ]]
    chamfer2_edges_2 = [part.edges().sort_by_distance(p)[0] for p in [
        (-24.66, 25, 5.5),
    ]]
    chamfer2_side_2 = [part.faces().sort_by_distance(p)[0] for p in [
        (-24.66, 25, 3.676174497),
    ]]
    chamfer2_edges_3 = [part.edges().sort_by_distance(p)[0] for p in [
        (-17.366776538, 66.361925627, 5.5),
    ]]
    chamfer2_side_3 = [part.faces().sort_by_distance(p)[0] for p in [
        (-17.366776538, 66.361925627, 3.676174497),
    ]]
    chamfer2_edges_4 = [part.edges().sort_by_distance(p)[0] for p in [
        (-58.266776538, 66.361925627, 5.5),
    ]]
    chamfer2_side_4 = [part.faces().sort_by_distance(p)[0] for p in [
        (-58.266776538, 66.361925627, 3.676174497),
    ]]
    chamfer2 = BRepFilletAPI_MakeChamfer(part.part.solid().wrapped)
    for e in chamfer2_edges_1:
        chamfer2.Add(CHAMFER2_SIZE, CHAMFER2_SIZE2, e.wrapped, chamfer2_side_1[0].wrapped)  # the first distance lies on this face
    for e in chamfer2_edges_2:
        chamfer2.Add(CHAMFER2_SIZE, CHAMFER2_SIZE2, e.wrapped, chamfer2_side_2[0].wrapped)  # the first distance lies on this face
    for e in chamfer2_edges_3:
        chamfer2.Add(CHAMFER2_SIZE, CHAMFER2_SIZE2, e.wrapped, chamfer2_side_3[0].wrapped)  # the first distance lies on this face
    for e in chamfer2_edges_4:
        chamfer2.Add(CHAMFER2_SIZE, CHAMFER2_SIZE2, e.wrapped, chamfer2_side_4[0].wrapped)  # the first distance lies on this face
    add(Compound.cast(chamfer2.Shape()), mode=Mode.REPLACE)


solid = part.part
